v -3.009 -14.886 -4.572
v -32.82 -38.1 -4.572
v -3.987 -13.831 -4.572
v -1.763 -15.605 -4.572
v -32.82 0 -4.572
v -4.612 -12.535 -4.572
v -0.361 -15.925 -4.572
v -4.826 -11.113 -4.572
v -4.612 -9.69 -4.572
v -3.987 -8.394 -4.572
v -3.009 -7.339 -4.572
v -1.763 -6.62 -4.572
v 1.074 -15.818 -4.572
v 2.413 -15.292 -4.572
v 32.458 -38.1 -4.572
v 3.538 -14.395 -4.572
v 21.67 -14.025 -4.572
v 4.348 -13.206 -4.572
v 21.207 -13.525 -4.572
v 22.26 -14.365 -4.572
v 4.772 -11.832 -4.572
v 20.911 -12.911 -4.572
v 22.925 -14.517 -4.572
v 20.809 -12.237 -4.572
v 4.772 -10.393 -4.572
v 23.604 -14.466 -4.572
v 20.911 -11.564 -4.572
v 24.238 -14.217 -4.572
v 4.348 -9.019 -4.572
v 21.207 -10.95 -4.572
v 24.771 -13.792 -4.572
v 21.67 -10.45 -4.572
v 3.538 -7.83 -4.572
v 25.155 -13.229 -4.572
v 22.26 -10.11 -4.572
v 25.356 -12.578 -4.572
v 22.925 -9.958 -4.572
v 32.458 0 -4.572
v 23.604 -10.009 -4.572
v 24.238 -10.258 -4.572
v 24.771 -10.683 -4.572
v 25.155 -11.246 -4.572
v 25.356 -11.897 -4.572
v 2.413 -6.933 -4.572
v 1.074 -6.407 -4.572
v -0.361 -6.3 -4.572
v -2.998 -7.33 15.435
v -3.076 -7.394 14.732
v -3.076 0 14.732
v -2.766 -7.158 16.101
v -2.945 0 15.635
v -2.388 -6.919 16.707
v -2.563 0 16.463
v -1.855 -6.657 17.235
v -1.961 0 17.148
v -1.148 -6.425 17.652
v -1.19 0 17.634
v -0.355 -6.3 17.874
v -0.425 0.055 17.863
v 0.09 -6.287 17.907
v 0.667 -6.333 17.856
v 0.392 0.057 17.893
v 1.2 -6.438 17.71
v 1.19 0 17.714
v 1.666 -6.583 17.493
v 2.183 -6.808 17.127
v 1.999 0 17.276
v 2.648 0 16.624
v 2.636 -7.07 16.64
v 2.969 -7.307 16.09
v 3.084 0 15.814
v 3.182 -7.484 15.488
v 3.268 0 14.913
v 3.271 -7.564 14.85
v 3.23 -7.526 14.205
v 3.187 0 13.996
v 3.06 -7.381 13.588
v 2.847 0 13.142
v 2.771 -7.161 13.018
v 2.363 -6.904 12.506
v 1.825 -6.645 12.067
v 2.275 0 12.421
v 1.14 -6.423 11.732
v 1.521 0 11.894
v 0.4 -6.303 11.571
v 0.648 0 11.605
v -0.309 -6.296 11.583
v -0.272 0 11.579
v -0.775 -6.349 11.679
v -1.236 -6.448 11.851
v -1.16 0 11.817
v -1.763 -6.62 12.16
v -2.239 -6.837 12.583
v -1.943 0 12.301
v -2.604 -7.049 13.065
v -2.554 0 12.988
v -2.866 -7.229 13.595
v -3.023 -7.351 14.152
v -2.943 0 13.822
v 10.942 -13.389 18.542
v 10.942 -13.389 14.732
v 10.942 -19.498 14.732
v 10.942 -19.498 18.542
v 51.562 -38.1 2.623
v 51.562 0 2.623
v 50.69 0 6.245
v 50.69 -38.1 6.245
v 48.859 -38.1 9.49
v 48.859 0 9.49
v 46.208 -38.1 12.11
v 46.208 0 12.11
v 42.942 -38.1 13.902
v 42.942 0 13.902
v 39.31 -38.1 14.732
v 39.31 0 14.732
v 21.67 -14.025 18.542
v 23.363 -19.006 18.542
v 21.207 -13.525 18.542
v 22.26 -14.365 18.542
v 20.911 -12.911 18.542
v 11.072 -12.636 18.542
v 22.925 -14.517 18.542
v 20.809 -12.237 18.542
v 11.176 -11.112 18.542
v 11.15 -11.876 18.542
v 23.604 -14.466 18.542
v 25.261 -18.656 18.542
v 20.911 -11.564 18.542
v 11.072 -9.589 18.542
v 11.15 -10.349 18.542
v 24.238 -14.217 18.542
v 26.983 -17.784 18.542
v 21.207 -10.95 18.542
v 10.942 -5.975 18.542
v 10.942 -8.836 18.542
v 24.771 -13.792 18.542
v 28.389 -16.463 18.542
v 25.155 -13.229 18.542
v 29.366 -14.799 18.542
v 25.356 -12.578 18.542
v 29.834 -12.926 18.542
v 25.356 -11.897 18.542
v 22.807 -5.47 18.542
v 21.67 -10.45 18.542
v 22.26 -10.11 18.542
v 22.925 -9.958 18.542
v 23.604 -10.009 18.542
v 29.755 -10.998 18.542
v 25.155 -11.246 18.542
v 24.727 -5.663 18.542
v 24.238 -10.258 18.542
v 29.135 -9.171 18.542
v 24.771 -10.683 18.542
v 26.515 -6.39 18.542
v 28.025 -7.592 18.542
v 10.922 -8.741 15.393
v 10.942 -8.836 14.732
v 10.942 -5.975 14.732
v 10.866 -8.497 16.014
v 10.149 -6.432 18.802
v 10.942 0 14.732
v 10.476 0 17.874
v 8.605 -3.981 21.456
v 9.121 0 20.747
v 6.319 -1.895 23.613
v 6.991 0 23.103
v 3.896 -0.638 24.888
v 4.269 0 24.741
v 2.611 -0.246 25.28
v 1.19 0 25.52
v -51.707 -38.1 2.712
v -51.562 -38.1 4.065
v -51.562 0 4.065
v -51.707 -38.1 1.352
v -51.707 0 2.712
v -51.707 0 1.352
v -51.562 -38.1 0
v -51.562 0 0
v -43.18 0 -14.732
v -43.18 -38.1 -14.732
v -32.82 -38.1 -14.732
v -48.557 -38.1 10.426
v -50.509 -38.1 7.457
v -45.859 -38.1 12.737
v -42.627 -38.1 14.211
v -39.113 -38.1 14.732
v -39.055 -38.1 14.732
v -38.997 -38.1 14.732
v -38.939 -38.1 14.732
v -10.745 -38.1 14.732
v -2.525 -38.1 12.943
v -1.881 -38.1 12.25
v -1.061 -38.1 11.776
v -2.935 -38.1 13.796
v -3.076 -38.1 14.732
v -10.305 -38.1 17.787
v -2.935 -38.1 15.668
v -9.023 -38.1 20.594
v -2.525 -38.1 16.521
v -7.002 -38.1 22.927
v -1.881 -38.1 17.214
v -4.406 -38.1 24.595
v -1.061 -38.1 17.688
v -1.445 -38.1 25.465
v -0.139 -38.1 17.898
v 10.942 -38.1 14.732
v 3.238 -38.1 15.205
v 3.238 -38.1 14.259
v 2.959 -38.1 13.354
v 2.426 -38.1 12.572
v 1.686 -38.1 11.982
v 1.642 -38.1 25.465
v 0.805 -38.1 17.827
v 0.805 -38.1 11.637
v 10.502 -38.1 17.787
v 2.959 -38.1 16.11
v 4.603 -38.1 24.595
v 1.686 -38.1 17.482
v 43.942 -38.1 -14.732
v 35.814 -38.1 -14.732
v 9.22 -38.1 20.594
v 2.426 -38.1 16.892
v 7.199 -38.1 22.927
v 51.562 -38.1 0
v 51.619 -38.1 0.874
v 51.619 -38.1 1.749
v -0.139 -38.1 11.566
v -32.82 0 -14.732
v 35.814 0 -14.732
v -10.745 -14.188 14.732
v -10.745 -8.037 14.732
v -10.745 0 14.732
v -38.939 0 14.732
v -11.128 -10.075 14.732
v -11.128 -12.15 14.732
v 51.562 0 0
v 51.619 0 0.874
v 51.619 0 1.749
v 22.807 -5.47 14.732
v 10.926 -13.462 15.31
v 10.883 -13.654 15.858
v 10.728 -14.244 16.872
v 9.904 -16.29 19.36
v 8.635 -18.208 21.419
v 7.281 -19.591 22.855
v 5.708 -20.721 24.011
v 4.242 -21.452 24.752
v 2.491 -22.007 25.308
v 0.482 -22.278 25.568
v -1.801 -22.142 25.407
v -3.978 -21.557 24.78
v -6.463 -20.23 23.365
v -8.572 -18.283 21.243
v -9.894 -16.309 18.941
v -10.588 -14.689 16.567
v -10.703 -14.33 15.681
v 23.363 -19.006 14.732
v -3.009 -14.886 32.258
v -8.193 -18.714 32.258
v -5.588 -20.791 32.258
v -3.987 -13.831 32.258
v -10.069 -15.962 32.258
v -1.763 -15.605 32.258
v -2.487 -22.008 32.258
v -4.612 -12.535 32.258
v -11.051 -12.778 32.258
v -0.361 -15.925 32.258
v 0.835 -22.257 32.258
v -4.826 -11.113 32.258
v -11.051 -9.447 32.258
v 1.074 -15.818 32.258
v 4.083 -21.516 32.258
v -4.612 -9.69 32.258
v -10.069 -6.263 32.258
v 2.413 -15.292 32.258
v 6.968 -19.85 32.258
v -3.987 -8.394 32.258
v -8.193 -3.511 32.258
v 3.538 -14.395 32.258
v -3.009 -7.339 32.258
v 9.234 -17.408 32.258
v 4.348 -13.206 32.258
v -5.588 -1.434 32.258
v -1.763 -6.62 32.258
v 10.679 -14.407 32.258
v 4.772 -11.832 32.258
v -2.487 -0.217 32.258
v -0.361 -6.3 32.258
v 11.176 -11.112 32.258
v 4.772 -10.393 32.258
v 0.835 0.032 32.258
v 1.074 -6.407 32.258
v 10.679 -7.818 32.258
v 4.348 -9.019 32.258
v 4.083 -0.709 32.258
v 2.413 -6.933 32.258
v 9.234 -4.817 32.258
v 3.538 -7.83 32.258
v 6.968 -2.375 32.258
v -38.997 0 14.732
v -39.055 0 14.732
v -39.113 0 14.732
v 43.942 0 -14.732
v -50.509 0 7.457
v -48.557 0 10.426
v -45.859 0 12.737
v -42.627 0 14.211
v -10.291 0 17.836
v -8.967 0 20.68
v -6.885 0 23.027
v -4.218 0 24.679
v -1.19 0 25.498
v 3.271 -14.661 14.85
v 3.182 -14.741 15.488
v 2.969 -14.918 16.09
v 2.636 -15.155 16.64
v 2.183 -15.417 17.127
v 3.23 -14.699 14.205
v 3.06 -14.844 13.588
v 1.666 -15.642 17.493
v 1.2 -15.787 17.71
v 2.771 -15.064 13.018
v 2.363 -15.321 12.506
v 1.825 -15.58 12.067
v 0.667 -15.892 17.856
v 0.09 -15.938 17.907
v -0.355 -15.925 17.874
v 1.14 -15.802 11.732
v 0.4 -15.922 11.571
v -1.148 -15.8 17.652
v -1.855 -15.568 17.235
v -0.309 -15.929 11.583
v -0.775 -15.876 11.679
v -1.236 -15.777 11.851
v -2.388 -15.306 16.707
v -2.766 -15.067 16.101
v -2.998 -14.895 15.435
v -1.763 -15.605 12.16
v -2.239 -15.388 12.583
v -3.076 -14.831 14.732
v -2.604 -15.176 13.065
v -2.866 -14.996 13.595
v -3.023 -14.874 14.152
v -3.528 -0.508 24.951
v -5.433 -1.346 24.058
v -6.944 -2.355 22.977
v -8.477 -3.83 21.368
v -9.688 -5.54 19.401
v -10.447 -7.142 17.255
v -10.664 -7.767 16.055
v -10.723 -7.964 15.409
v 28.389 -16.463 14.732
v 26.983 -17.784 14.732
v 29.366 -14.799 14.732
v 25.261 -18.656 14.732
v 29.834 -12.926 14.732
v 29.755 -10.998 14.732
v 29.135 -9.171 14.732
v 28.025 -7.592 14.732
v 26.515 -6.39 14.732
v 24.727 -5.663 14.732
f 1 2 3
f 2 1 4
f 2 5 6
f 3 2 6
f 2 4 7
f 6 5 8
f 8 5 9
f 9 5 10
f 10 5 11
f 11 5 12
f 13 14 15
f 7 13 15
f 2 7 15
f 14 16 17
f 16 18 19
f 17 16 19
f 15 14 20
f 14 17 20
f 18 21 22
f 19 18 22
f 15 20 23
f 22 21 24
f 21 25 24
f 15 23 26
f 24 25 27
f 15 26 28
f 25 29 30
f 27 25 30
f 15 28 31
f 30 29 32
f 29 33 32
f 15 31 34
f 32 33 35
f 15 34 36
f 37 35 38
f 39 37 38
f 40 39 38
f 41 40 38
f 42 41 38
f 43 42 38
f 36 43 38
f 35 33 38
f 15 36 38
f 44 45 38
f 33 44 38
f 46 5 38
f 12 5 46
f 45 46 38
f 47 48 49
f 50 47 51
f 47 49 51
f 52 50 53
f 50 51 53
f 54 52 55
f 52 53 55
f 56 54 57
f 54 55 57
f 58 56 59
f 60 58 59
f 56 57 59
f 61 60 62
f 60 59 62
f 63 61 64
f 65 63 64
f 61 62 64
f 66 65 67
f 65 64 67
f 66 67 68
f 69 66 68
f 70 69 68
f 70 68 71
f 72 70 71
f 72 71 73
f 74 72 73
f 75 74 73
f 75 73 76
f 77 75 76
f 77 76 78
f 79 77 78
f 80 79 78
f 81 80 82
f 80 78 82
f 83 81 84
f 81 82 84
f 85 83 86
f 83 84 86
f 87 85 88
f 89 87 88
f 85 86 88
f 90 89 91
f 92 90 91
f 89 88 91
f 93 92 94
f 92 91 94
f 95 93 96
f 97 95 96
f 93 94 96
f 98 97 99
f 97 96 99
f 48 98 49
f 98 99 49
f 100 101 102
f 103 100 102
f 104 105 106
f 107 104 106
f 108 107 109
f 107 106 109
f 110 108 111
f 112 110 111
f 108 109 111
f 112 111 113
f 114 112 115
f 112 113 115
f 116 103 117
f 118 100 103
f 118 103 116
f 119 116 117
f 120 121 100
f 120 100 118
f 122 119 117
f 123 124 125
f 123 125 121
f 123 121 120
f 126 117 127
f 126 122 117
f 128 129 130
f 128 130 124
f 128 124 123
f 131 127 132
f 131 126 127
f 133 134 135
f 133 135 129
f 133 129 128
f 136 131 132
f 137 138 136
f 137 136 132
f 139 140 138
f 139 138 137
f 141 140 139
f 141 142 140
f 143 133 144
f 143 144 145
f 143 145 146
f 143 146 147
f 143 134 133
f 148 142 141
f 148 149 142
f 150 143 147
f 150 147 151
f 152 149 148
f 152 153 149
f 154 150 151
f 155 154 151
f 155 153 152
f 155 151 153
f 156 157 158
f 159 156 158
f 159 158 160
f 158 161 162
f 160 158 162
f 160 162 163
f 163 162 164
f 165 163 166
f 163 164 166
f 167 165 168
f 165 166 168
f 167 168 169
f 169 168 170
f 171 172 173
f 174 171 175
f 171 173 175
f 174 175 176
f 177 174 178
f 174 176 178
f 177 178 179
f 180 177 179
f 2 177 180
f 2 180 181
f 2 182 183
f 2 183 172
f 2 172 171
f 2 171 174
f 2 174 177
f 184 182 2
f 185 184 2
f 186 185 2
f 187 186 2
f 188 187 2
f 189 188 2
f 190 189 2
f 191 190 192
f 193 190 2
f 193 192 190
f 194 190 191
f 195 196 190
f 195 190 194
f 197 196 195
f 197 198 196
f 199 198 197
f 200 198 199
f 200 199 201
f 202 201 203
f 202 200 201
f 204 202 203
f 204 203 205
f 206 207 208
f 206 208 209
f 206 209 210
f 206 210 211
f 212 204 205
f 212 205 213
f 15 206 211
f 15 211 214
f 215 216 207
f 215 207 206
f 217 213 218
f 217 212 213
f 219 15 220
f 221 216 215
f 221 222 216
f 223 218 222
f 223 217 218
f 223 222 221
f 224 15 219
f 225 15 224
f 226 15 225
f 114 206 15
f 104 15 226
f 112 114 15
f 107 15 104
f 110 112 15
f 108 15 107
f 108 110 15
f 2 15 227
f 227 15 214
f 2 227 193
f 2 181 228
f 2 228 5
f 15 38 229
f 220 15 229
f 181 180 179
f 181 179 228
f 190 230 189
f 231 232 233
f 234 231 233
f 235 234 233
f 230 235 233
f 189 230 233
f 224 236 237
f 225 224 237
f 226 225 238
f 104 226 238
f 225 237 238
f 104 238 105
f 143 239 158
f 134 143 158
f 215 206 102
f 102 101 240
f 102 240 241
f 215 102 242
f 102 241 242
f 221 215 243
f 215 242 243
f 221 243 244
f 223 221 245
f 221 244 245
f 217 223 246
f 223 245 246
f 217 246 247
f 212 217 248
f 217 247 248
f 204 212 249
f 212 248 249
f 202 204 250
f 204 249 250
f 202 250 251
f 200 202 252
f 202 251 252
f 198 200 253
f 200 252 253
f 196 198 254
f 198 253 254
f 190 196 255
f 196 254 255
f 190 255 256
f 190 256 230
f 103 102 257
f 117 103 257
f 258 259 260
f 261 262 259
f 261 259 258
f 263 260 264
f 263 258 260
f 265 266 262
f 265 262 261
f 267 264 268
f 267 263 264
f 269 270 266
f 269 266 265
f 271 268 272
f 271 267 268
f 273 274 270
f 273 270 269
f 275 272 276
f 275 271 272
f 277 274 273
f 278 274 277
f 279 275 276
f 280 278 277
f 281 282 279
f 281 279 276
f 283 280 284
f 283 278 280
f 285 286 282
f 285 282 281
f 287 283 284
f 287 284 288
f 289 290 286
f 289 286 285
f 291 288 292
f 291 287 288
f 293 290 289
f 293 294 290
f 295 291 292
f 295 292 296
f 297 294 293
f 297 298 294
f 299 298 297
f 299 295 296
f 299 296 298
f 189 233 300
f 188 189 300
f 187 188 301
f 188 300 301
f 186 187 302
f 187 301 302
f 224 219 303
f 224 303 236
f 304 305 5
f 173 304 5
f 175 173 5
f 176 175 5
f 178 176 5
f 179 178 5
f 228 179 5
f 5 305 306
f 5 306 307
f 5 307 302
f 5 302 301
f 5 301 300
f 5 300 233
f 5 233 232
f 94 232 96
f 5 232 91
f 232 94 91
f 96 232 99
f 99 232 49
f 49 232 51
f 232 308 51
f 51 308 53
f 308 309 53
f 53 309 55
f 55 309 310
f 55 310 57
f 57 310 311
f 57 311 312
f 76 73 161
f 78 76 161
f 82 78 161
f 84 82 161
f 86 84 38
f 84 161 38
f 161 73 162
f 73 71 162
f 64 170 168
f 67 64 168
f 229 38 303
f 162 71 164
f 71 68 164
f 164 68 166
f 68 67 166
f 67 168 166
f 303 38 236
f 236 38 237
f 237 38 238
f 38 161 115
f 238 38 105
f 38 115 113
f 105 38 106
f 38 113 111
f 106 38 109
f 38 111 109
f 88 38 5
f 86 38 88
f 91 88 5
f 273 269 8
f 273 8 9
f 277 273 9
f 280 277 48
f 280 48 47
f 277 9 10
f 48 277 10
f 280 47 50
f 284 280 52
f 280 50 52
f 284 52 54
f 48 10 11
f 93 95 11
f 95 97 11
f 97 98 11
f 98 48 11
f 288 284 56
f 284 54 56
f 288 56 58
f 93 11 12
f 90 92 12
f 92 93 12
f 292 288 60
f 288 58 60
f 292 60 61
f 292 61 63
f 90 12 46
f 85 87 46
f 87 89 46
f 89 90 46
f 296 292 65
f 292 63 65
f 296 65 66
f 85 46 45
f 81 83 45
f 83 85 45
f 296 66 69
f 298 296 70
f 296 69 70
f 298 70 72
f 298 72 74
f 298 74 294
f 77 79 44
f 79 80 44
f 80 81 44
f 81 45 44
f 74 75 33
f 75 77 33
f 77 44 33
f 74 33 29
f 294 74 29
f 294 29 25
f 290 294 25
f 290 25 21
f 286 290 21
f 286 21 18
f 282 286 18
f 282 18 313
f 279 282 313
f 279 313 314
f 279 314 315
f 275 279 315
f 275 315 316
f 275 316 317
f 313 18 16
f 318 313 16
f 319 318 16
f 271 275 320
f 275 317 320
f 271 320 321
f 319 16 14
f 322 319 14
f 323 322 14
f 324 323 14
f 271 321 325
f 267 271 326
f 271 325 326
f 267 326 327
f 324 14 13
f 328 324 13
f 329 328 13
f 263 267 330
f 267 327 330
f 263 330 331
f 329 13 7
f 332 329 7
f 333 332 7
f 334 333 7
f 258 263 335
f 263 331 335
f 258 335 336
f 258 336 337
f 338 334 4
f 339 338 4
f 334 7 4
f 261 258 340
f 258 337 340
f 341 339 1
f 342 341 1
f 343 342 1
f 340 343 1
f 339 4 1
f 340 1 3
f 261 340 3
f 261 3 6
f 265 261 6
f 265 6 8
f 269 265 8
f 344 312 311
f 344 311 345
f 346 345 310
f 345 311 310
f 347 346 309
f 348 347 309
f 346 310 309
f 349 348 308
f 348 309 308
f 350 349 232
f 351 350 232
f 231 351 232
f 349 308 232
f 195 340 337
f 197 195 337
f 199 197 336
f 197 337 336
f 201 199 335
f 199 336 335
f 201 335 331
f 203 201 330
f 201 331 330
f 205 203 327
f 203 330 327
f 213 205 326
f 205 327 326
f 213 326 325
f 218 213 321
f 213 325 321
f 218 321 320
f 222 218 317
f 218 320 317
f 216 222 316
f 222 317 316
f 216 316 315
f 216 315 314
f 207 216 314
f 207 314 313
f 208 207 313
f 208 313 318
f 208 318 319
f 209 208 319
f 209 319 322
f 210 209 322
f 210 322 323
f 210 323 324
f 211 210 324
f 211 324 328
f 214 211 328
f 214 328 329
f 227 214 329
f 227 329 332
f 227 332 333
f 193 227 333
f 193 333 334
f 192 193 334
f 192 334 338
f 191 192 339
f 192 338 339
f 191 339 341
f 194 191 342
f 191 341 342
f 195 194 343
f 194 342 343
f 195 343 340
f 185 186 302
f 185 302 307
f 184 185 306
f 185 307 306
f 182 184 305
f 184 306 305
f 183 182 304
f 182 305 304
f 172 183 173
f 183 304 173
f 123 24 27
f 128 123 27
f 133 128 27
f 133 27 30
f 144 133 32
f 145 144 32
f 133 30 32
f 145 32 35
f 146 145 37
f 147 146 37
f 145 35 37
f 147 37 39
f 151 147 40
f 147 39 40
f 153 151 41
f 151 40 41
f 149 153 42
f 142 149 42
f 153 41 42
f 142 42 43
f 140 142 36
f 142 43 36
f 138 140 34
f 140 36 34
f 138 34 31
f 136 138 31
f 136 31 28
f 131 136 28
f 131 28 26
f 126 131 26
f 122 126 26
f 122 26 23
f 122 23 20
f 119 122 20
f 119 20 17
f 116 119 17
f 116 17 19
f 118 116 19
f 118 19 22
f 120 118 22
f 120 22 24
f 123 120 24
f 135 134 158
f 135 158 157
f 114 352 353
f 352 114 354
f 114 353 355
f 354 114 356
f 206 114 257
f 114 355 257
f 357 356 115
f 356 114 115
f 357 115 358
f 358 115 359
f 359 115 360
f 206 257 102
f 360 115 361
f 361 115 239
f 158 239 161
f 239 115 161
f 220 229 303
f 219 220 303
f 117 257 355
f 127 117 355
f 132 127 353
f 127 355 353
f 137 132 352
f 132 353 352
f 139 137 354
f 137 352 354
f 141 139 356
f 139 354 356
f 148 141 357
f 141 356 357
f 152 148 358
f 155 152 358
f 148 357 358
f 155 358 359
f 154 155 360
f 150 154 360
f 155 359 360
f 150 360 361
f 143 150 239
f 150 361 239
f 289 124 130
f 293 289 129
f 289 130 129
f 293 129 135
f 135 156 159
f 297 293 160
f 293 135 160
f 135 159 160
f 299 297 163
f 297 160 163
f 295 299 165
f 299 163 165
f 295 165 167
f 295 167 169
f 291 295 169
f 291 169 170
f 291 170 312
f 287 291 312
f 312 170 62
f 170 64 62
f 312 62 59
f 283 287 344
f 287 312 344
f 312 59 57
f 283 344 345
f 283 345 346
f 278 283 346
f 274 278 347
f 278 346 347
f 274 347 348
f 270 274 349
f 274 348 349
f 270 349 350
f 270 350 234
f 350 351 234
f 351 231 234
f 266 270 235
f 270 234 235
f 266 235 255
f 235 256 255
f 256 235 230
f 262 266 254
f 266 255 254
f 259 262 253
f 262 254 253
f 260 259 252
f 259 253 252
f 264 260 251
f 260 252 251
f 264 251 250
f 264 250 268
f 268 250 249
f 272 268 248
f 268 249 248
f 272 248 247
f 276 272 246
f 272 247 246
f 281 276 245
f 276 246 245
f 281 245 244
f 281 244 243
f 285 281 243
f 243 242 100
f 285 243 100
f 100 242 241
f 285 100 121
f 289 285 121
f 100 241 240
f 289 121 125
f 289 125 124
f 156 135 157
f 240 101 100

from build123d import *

# Parameters (mm, degrees)
F1_DEPTH = 38.1
F2_R     = 11.176
F3_DEPTH = 17.526
F5_D     = 9.652
F7_DEPTH = 3.81
F9_D     = 4.572
F11_D    = 6.35


with BuildPart() as f1:
    # F0 (on Front) → F1 (new body)
    with BuildSketch(Plane.XZ):
        with BuildLine():
            Line((-51.562, 0), (-43.18, -14.732))
            Line((-43.18, -14.732), (-32.8198596835, -14.732))
            Line((-32.8198596835, -14.732), (-32.8198596835, -4.572))
            Line((-32.8198596835, -4.572), (32.4581403165, -4.572))
            Line((32.4581403165, -4.572), (35.814, -14.732))
            Line((35.814, -14.732), (43.942, -14.732))
            Line((43.942, -14.732), (51.562, 0))
            Line((51.562, 0), (51.562, 2.6228378818))
            ThreePointArc((51.562, 2.6228378818), (47.6245523403, 10.89201932), (39.3096618354, 14.732))
            Line((39.3096618354, 14.732), (10.9417002025, 14.732))
            ThreePointArc((10.9417002025, 14.732), (0.0985790513, 25.5751211511), (-10.7445420998, 14.732))
            Line((-10.7445420998, 14.732), (-38.9388203621, 14.732))
            Line((-38.9388203621, 14.732), (-39.1125037328, 14.732))
            ThreePointArc((-39.1125037328, 14.732), (-47.2891089477, 11.676229996), (-51.562, 4.0645938241))
            Line((-51.562, 4.0645938241), (-51.562, 0))
        make_face()
        with BuildLine():
            ThreePointArc((-51.562, 4.0645938241), (-51.7256620474, 2.0322969121), (-51.562, 0))
            Line((-51.562, 0), (-51.562, 4.0645938241))
        make_face()
        with BuildLine():
            ThreePointArc((-38.9388203621, 14.732), (-39.0256620474, 14.7322969121), (-39.1125037328, 14.732))
            Line((-39.1125037328, 14.732), (-38.9388203621, 14.732))
        make_face()
        with BuildLine():
            Line((51.562, 2.6228378818), (51.562, 0))
            ThreePointArc((51.562, 0), (51.6259904882, 1.3114189409), (51.562, 2.6228378818))
        make_face()
    extrude(amount=F1_DEPTH)

    # F2 (on face) → F3 (join)
    with BuildSketch(Plane.XY.offset(14.732)):
        with Locations((0, -11.1125)):
            Circle(F2_R)
    extrude(amount=F3_DEPTH)

    # F5 (through all)
    with Locations(Plane.XY.offset(32.258)):
        with Locations((0, -11.1125)):
            Hole(F5_D / 2)

    # F6 (on face) → F7 (join)
    with BuildSketch(Plane.XY.offset(14.732)):
        with BuildLine():
            Line((10.9417002025, -19.4975990474), (23.3632903546, -19.0058518201))
            ThreePointArc((23.3632903546, -19.0058518201), (29.8632890709, -11.9593614946), (22.8070225567, -5.4699769244))
            Line((22.8070225567, -5.4699769244), (10.9417002025, -5.9754836616))
            Line((10.9417002025, -5.9754836616), (10.9417002025, -8.8360614044))
            ThreePointArc((10.9417002025, -8.8360614044), (11.1172707411, -9.9682678257), (11.176, -11.1125))
            ThreePointArc((11.176, -11.1125), (11.1172707411, -12.2567321743), (10.9417002025, -13.3889385956))
            Line((10.9417002025, -13.3889385956), (10.9417002025, -19.4975990474))
        make_face()
    extrude(amount=F7_DEPTH)

    # F9 (through all)
    with Locations(Plane.XY.offset(18.542)):
        with Locations((23.0953439556, -12.2374957086)):
            Hole(F9_D / 2)

    # F11 (through all)
    with Locations(Plane.XZ.offset(38.1)):
        with Locations((0.0985790513, 14.732)):
            Hole(F11_D / 2)


solid = f1.part
